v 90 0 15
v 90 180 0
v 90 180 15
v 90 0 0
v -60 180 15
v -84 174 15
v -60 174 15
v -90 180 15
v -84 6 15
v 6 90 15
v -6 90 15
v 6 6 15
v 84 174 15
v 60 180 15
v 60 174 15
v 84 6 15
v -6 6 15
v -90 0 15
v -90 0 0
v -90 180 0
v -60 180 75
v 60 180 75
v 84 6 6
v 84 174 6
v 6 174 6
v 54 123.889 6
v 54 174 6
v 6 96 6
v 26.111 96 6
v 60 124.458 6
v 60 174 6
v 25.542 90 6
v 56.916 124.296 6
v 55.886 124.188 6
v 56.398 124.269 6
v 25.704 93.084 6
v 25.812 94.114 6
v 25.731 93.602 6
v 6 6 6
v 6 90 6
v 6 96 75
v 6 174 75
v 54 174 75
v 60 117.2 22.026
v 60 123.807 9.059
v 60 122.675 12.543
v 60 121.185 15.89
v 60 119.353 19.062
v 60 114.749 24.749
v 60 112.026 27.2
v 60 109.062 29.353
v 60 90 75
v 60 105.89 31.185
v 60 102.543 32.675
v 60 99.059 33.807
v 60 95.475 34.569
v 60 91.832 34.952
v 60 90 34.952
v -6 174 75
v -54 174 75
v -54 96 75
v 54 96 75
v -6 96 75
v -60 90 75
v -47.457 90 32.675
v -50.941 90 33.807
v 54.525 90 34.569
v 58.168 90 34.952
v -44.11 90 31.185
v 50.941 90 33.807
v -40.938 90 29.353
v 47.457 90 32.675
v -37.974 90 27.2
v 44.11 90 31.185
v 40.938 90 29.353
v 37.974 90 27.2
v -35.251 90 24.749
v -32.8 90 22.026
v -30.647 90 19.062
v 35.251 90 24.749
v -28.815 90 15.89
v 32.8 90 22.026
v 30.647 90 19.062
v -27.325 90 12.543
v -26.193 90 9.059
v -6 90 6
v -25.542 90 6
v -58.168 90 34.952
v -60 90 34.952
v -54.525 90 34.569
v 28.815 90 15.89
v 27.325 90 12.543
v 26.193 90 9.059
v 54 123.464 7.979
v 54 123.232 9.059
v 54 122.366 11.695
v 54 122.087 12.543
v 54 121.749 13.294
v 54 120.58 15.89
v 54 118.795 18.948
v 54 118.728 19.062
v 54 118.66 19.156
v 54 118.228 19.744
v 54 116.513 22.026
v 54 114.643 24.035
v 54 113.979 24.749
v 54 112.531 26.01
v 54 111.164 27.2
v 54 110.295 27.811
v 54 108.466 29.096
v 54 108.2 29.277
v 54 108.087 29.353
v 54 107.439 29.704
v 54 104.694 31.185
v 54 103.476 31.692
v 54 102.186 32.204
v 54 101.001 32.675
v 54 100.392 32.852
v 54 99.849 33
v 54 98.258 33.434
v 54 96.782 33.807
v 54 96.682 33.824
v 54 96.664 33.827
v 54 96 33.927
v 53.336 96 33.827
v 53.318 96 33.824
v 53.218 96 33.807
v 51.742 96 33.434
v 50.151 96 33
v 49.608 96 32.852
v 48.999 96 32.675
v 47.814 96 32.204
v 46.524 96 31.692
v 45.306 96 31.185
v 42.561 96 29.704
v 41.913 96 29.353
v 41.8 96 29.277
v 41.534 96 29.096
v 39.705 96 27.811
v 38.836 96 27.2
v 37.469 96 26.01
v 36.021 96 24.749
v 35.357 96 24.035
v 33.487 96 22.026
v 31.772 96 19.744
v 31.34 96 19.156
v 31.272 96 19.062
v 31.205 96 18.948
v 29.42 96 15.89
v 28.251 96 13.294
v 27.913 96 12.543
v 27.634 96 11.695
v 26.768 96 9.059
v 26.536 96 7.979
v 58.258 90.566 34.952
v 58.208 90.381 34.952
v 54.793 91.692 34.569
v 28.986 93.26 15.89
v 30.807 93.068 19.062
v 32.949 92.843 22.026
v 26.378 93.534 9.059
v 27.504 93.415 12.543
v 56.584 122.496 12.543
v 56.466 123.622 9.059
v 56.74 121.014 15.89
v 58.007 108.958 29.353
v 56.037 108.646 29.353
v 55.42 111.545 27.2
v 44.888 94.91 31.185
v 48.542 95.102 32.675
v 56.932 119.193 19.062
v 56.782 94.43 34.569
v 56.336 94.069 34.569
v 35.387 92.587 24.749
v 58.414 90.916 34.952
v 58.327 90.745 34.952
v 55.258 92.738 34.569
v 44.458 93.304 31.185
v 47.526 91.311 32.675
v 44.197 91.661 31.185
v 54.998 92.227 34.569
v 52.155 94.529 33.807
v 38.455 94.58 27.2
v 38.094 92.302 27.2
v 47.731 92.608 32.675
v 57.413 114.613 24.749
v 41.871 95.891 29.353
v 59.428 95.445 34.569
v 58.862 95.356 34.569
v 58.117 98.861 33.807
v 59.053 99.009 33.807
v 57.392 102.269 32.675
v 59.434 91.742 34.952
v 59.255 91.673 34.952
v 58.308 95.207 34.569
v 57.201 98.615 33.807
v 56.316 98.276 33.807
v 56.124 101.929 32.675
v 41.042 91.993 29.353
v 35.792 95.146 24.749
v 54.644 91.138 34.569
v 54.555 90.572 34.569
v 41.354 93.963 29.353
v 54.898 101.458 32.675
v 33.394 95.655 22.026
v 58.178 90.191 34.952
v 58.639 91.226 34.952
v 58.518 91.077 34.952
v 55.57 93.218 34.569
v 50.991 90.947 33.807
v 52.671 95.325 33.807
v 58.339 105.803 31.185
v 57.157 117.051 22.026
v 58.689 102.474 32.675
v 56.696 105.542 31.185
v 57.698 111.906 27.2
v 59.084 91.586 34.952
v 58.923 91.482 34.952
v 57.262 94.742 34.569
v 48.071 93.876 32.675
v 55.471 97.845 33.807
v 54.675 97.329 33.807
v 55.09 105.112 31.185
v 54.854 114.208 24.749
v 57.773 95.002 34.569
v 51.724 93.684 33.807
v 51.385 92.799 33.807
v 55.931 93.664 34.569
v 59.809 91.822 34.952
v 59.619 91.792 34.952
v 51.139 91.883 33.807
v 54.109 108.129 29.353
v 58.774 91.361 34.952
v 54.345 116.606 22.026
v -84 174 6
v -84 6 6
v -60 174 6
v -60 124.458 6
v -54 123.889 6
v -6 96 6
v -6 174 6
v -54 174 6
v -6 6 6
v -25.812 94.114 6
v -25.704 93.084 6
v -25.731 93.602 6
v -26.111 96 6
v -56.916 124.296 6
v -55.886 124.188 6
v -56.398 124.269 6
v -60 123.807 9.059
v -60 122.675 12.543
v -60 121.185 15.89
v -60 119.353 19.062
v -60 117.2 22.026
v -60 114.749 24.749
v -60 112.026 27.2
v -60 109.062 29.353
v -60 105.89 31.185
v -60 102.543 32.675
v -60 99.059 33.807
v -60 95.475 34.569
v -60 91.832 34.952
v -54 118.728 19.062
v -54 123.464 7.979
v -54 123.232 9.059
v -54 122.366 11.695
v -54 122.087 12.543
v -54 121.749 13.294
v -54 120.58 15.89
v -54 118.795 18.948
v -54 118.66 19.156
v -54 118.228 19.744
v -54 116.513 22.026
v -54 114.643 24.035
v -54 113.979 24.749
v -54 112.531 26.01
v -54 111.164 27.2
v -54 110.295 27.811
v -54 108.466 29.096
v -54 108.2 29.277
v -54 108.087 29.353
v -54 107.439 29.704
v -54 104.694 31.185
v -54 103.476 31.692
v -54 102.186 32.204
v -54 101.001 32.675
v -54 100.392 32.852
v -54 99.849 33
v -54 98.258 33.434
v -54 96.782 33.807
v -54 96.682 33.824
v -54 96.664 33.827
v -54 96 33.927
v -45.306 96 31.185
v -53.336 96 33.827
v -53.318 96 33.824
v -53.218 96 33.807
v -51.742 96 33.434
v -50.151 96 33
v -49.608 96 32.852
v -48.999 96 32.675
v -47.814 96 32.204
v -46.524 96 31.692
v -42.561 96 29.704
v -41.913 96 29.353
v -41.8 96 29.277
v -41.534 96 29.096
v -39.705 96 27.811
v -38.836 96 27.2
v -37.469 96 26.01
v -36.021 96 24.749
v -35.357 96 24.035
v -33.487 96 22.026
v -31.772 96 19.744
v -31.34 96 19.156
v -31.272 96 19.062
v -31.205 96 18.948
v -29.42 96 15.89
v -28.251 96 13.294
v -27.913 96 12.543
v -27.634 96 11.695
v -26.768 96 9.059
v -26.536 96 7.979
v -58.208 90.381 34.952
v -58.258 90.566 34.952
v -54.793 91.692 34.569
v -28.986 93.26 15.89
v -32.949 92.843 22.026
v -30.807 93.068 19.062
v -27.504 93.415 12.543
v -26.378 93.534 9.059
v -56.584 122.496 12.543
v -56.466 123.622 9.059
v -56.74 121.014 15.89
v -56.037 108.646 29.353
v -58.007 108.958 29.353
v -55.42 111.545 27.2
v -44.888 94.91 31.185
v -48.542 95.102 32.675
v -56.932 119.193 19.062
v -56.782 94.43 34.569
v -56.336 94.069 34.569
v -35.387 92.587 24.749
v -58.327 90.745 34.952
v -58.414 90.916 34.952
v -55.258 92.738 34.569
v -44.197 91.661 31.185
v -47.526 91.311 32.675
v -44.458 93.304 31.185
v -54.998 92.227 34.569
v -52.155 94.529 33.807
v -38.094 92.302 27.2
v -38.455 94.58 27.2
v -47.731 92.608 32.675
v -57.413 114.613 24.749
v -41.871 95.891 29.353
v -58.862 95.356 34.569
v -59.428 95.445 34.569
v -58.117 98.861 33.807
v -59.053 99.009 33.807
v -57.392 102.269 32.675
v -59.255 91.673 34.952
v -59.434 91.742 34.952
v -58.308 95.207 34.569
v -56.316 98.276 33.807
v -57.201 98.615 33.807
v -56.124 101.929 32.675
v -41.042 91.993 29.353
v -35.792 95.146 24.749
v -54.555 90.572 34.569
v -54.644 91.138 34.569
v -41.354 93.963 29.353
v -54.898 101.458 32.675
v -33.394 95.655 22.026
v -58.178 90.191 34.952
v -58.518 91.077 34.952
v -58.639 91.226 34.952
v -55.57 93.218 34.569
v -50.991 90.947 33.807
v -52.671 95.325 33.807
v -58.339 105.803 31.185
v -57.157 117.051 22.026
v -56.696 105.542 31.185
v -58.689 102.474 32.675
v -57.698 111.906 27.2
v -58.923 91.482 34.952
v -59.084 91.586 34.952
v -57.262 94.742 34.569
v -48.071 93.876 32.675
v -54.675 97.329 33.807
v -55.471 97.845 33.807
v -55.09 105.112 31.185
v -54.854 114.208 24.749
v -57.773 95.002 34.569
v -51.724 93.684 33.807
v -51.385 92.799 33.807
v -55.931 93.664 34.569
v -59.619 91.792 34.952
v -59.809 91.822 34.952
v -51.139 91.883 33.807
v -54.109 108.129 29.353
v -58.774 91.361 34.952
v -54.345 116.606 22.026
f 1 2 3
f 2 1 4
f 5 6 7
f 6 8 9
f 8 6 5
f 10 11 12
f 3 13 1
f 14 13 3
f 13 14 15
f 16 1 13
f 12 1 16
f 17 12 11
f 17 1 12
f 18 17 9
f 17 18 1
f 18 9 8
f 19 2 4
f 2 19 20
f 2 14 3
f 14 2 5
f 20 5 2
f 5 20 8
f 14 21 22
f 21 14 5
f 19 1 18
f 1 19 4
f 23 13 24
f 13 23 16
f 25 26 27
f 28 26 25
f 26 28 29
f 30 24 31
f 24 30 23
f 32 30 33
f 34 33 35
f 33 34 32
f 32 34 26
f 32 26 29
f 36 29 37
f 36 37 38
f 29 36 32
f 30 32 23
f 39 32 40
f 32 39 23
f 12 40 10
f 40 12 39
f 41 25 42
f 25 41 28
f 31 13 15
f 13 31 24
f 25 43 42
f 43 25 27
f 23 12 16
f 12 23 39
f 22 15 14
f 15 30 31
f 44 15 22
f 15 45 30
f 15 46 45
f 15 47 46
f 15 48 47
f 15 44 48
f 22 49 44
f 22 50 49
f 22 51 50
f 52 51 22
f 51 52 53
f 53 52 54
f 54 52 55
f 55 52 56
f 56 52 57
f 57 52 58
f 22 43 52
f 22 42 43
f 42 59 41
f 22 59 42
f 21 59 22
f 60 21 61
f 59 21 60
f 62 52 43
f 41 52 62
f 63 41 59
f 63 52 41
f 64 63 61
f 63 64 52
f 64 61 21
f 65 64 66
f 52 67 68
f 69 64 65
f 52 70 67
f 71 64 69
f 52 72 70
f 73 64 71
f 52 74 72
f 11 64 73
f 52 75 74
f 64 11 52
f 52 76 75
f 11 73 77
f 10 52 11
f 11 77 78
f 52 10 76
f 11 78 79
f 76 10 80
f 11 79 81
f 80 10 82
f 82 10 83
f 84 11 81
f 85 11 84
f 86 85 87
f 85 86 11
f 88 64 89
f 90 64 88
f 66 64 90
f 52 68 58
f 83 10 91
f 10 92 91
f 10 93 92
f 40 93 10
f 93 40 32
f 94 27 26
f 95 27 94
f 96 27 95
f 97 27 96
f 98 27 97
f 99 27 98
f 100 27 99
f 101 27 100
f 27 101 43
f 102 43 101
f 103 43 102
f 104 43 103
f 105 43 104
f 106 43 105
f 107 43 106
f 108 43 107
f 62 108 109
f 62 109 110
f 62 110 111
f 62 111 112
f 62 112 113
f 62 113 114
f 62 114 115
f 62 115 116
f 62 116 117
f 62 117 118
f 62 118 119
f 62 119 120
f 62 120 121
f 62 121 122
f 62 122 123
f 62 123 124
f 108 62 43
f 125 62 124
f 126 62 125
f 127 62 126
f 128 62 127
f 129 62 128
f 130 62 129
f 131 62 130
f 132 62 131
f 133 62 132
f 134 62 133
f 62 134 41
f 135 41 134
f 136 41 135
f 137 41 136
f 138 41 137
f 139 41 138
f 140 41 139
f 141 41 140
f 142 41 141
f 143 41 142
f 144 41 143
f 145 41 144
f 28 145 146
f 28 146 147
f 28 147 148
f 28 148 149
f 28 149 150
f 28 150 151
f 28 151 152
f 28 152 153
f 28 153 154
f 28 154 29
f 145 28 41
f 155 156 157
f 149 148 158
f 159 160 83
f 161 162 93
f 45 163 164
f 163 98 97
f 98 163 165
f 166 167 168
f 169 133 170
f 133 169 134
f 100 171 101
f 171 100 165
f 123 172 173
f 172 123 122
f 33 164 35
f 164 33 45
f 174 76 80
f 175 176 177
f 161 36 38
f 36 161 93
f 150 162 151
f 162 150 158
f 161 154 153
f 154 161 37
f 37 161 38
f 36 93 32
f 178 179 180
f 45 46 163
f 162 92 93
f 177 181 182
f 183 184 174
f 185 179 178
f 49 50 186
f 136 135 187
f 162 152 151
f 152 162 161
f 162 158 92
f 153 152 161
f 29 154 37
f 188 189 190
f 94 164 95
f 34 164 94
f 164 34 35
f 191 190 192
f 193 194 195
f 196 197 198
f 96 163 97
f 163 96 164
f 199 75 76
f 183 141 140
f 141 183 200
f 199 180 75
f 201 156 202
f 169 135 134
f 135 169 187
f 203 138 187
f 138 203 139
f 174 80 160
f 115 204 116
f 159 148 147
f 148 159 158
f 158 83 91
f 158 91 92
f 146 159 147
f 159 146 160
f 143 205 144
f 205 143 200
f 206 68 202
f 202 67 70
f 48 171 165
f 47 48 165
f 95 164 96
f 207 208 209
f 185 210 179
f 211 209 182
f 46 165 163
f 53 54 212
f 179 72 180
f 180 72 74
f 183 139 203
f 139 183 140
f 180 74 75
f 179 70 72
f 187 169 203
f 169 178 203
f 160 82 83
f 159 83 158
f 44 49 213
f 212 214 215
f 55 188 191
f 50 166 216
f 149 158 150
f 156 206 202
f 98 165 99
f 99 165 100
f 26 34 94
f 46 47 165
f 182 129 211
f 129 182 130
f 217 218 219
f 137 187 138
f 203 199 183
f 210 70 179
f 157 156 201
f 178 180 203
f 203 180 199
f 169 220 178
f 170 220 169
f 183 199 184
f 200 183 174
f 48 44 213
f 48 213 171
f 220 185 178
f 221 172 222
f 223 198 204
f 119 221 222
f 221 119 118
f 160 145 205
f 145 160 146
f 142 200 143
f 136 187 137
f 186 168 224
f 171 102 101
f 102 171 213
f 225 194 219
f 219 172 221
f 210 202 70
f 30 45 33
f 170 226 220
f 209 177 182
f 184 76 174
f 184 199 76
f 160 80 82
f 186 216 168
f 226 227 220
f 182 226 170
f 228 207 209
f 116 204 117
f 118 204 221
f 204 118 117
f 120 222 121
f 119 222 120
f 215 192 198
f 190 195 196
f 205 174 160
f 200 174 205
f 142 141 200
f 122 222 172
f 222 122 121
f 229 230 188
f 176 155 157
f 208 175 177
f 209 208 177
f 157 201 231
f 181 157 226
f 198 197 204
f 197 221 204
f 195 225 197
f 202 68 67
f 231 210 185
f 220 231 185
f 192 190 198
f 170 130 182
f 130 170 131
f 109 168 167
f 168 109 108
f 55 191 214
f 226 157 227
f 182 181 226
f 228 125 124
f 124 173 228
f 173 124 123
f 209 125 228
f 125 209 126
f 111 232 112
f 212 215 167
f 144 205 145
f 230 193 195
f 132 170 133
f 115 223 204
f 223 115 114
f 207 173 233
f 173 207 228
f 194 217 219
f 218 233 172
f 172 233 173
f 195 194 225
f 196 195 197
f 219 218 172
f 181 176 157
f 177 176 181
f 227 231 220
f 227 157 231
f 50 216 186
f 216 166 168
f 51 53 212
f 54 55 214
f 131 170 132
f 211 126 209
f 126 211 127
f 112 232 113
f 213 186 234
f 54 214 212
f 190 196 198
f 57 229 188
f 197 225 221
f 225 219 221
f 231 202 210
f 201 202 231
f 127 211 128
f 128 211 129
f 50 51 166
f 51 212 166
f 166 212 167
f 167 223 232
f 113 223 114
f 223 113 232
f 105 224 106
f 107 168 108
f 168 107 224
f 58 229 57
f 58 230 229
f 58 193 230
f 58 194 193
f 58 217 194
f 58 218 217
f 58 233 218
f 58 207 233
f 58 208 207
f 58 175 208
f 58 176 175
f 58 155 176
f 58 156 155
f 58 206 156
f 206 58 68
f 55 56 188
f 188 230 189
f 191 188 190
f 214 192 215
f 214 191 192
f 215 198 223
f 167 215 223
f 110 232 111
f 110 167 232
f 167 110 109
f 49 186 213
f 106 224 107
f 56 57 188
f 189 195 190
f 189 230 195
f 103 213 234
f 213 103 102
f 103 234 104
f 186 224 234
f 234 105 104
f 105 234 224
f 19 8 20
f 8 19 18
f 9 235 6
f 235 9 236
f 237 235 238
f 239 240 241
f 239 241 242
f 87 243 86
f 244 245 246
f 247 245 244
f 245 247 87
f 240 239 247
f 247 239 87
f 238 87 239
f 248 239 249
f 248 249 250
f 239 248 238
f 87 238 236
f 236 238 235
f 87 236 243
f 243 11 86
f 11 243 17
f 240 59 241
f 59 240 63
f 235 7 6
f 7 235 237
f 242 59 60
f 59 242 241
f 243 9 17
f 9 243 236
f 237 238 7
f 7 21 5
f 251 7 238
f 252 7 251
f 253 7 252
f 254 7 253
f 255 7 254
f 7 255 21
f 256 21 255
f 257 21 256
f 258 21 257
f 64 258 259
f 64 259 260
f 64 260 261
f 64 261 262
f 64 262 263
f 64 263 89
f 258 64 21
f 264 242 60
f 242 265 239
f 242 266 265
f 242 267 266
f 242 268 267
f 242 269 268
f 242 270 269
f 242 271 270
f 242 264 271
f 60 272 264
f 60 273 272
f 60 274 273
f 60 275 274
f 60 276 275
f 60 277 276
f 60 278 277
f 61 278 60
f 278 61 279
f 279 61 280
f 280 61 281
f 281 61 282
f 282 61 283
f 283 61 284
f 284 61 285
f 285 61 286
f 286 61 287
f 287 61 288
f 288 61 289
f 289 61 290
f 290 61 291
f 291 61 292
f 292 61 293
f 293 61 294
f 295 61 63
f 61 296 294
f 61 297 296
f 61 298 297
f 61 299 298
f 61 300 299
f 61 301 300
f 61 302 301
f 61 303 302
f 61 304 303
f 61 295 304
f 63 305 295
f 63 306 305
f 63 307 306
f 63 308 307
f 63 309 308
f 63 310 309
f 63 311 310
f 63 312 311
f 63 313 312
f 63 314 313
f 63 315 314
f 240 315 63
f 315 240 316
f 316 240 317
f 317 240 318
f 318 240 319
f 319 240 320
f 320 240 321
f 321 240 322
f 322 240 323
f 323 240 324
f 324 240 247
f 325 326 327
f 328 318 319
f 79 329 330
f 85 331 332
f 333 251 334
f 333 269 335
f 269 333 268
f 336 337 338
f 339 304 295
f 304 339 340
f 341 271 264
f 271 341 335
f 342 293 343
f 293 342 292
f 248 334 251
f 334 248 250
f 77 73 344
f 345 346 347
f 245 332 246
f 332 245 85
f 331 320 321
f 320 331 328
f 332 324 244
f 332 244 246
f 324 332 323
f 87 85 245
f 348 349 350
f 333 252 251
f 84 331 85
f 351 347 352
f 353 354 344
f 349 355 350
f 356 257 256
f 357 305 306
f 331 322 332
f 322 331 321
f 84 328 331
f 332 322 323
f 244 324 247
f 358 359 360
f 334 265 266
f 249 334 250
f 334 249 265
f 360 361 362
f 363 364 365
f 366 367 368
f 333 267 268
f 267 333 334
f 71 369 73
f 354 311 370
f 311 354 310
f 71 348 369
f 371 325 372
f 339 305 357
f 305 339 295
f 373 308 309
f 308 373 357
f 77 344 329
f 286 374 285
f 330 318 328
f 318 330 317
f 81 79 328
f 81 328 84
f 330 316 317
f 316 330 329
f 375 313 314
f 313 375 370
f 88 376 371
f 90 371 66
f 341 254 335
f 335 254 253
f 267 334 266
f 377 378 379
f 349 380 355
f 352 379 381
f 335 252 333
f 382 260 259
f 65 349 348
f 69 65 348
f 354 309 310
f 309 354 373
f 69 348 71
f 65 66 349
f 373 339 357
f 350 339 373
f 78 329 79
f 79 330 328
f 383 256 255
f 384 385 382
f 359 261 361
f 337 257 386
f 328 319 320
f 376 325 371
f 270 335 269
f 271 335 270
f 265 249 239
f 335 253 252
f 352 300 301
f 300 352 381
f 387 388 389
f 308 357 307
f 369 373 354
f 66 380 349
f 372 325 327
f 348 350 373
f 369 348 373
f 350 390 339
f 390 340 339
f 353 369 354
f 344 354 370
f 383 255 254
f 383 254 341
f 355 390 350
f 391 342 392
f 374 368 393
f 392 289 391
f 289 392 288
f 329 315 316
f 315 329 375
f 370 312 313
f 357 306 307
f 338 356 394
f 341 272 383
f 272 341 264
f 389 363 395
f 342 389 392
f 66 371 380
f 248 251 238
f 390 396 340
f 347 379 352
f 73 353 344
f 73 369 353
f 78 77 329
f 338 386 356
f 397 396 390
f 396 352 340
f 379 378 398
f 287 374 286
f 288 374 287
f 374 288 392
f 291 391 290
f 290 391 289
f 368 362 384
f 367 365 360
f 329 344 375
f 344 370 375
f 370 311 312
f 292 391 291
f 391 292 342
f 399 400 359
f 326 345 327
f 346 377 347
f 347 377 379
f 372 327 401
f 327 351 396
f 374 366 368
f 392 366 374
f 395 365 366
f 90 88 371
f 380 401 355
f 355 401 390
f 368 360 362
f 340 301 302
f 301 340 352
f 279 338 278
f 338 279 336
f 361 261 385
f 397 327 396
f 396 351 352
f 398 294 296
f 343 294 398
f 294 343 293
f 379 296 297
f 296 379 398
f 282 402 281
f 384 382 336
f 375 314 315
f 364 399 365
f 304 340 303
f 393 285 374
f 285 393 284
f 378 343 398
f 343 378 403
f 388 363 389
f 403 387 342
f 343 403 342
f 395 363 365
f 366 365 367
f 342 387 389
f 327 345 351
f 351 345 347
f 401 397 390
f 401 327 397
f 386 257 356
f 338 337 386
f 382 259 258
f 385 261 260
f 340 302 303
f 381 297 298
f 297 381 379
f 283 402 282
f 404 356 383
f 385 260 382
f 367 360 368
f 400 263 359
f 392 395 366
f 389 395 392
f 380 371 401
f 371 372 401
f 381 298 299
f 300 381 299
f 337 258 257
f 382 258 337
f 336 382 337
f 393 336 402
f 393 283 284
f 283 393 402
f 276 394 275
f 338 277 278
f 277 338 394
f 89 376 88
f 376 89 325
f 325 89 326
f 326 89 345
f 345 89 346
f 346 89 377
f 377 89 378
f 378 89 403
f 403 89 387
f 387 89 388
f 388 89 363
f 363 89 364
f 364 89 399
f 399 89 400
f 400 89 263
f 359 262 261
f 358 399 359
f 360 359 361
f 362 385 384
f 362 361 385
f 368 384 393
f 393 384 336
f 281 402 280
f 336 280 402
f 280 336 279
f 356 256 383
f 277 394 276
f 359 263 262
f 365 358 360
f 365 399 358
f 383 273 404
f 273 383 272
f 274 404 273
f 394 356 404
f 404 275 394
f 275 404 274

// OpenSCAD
module right_half()
	union() {
		difference() {
			cube([90, 180, 15]);
			translate([6, 6, 6]) cube([78, 168, 10]);
		}
		translate([0, 90])
			difference() {
				cube([60, 90, 75]);
				translate([6, 6, 5]) cube([48, 78, 71]);
				translate([60, 0]) sphere(r=35, $fn=60);
			}
	}

module left_half()
	mirror([90, 0, 0]) right_half();

union() {
	left_half();
	right_half();
}
